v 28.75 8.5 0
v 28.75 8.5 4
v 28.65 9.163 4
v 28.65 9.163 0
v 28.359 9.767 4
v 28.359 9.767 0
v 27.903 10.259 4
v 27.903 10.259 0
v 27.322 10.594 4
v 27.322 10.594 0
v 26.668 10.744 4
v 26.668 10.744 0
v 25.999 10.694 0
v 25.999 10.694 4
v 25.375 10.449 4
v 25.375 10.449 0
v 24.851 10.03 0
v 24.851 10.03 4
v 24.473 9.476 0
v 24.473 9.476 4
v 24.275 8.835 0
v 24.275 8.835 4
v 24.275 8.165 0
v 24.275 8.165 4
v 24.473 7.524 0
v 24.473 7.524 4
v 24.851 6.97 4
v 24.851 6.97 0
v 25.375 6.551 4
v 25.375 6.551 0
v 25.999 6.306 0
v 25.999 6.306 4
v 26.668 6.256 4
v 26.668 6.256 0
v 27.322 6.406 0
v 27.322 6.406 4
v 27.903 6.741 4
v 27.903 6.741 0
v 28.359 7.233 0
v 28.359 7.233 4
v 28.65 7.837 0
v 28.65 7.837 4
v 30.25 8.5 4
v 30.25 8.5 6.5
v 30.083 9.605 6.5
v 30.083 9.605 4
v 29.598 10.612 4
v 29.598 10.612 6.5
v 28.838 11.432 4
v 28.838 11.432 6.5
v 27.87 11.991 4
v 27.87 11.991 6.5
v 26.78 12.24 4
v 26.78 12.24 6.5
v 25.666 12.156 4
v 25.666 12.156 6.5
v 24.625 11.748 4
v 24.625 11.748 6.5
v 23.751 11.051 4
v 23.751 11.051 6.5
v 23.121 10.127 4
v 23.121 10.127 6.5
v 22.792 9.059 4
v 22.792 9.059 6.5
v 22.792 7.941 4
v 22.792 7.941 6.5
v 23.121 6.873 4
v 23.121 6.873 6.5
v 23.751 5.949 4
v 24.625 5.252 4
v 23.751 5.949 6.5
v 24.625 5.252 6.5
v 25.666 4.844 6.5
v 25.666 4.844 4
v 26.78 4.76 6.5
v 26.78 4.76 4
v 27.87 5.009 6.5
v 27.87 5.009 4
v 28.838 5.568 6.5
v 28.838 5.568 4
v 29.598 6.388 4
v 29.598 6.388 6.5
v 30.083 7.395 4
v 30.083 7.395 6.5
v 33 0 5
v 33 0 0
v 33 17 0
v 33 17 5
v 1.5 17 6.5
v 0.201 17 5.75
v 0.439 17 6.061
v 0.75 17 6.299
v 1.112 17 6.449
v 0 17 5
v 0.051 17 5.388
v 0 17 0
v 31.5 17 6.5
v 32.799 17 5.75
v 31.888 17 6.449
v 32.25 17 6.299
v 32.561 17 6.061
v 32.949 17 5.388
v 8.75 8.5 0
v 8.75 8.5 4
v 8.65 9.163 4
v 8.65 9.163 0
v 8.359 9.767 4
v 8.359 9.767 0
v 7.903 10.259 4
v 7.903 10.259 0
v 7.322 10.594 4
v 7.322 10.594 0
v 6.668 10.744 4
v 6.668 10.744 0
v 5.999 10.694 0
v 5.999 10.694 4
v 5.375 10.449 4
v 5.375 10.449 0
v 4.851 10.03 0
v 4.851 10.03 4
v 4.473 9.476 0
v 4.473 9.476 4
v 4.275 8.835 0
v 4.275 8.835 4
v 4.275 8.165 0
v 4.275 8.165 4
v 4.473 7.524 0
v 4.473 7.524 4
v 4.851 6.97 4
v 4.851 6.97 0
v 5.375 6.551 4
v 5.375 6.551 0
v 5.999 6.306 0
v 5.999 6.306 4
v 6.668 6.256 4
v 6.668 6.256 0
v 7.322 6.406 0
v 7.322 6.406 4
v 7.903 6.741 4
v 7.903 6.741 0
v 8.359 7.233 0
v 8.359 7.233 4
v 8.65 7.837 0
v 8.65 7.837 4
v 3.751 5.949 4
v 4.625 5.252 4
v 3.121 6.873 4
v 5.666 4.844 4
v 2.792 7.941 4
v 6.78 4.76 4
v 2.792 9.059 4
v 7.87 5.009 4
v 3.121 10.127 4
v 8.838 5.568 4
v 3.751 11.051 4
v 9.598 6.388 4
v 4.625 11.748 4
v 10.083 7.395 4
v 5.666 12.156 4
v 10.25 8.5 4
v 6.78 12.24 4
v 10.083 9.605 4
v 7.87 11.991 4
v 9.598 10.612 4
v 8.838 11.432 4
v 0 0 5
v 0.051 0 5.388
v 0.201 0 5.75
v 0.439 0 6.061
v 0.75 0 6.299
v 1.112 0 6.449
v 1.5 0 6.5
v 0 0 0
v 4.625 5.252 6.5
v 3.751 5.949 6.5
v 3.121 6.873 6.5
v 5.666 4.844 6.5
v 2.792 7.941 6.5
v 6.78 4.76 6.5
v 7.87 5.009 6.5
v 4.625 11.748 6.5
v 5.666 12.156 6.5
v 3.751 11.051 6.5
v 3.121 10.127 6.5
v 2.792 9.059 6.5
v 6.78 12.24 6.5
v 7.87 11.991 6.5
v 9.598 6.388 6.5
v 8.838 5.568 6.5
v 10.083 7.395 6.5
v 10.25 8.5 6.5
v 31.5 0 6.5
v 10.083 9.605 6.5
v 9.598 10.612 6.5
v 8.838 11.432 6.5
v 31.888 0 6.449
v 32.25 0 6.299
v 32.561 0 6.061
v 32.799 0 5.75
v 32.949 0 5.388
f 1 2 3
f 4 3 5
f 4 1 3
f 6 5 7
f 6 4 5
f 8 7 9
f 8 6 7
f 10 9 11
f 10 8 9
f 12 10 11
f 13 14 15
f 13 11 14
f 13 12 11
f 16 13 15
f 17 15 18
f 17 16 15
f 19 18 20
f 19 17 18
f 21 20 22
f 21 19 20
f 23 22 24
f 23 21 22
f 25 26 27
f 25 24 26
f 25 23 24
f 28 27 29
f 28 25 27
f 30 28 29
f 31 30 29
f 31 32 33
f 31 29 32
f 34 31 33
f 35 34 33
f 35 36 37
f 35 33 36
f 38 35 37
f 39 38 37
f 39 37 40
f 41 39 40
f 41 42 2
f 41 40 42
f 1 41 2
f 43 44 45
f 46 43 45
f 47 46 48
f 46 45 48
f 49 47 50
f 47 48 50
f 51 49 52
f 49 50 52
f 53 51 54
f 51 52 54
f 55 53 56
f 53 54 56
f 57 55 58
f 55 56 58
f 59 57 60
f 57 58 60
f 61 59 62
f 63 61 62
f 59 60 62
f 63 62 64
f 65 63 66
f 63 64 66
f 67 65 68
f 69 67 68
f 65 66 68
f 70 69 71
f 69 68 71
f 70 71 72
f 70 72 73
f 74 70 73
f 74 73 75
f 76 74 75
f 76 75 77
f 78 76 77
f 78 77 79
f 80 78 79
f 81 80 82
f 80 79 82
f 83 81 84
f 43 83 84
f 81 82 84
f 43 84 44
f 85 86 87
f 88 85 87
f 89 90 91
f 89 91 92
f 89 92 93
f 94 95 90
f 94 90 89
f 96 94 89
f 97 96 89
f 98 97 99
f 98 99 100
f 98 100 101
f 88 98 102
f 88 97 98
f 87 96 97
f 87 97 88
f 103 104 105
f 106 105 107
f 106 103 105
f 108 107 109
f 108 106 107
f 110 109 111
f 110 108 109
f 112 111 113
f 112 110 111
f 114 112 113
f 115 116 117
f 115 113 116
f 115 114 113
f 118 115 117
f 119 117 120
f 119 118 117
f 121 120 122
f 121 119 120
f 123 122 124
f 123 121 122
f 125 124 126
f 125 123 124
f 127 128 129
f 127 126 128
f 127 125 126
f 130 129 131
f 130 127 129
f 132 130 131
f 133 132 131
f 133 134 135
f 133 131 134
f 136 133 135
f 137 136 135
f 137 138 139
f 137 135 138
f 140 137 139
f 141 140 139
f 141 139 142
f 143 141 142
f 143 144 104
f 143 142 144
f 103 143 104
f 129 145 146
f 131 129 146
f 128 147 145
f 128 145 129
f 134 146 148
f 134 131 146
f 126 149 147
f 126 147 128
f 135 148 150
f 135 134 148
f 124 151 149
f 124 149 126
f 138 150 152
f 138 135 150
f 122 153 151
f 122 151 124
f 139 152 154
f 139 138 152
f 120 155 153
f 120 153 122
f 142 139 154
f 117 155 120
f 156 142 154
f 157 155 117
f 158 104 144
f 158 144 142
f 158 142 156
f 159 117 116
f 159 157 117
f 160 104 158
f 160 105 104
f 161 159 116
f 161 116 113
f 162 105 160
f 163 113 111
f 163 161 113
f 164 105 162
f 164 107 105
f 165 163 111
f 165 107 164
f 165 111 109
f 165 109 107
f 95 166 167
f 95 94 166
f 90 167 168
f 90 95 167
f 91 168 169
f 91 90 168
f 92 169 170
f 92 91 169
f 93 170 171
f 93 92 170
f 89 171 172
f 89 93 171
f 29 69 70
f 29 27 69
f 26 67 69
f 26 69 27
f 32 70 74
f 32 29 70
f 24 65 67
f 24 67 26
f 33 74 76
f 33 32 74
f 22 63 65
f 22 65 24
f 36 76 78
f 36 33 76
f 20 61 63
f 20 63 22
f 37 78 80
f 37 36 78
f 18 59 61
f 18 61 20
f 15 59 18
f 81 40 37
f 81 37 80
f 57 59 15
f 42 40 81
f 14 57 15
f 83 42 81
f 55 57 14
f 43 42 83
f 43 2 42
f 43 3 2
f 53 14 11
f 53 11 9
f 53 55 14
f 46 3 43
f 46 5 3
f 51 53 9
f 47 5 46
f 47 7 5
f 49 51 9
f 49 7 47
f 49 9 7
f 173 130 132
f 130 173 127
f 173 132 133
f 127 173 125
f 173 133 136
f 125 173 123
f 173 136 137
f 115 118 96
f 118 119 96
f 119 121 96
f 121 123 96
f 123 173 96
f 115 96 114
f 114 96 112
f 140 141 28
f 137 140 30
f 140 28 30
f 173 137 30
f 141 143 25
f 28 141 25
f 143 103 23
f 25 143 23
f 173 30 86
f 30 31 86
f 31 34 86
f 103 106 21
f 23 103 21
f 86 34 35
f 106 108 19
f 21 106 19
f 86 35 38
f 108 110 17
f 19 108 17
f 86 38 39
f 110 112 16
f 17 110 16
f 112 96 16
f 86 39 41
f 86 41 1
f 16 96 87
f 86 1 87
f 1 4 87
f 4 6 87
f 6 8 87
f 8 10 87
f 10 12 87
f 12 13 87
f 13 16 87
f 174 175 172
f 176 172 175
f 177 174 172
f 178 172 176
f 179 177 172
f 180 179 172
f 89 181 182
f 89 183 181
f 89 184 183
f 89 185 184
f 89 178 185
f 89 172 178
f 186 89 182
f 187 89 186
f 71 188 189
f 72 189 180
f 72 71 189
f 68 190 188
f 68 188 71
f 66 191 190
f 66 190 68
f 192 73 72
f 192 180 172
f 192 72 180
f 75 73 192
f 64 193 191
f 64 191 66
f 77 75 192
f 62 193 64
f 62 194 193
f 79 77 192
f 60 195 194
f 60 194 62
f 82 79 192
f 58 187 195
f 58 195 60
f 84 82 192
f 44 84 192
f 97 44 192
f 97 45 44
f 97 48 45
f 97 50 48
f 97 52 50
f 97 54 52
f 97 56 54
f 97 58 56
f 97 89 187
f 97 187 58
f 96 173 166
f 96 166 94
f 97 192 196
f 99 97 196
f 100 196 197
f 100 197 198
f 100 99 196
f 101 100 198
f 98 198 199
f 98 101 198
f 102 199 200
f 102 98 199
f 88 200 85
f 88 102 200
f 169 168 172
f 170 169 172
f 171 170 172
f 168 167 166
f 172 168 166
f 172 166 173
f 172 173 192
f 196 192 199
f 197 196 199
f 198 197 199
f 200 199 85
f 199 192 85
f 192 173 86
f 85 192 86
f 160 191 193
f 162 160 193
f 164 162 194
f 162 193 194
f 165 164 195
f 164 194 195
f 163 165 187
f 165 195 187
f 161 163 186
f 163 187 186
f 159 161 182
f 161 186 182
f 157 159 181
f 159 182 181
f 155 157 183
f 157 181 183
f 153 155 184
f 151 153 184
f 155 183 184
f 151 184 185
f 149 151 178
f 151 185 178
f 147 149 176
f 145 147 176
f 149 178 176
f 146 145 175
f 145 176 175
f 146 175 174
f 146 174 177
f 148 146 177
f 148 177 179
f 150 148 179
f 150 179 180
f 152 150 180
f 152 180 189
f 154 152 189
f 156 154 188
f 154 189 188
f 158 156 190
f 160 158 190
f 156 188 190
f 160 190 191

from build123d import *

# Parameters (mm, degrees)
SKETCH_W     = 33
SKETCH_H     = 17
SKETCH_R     = 2.25
PAD_DEPTH    = 6.5
SKETCH001_R  = 3.75
POCKET_DEPTH = 2.5
FILLET_R     = 1.5


with BuildPart() as part:
    # Sketch → Pad (new body)
    with BuildSketch(Plane.XY):
        with Locations((16.5, 8.5)):
            Rectangle(SKETCH_W, SKETCH_H)
        with Locations((6.5, 8.5)):
            Circle(SKETCH_R, mode=Mode.SUBTRACT)
        with Locations((26.5, 8.5)):
            Circle(SKETCH_R, mode=Mode.SUBTRACT)
    extrude(amount=PAD_DEPTH)

    # Sketch001 (on Face8 of Pad) → Pocket (cut)
    with BuildSketch(Plane.XY.offset(6.5)):
        with Locations((6.5, 8.5)):
            Circle(SKETCH001_R)
        with Locations((26.5, 8.5)):
            Circle(SKETCH001_R)
    extrude(amount=-POCKET_DEPTH, mode=Mode.SUBTRACT)

    # Fillet
    fillet_edges = [part.edges().sort_by_distance(p)[0] for p in [
        (33, 8.5, 6.5),
        (0, 8.5, 6.5),
    ]]
    fillet(fillet_edges, radius=FILLET_R)


solid = part.part
